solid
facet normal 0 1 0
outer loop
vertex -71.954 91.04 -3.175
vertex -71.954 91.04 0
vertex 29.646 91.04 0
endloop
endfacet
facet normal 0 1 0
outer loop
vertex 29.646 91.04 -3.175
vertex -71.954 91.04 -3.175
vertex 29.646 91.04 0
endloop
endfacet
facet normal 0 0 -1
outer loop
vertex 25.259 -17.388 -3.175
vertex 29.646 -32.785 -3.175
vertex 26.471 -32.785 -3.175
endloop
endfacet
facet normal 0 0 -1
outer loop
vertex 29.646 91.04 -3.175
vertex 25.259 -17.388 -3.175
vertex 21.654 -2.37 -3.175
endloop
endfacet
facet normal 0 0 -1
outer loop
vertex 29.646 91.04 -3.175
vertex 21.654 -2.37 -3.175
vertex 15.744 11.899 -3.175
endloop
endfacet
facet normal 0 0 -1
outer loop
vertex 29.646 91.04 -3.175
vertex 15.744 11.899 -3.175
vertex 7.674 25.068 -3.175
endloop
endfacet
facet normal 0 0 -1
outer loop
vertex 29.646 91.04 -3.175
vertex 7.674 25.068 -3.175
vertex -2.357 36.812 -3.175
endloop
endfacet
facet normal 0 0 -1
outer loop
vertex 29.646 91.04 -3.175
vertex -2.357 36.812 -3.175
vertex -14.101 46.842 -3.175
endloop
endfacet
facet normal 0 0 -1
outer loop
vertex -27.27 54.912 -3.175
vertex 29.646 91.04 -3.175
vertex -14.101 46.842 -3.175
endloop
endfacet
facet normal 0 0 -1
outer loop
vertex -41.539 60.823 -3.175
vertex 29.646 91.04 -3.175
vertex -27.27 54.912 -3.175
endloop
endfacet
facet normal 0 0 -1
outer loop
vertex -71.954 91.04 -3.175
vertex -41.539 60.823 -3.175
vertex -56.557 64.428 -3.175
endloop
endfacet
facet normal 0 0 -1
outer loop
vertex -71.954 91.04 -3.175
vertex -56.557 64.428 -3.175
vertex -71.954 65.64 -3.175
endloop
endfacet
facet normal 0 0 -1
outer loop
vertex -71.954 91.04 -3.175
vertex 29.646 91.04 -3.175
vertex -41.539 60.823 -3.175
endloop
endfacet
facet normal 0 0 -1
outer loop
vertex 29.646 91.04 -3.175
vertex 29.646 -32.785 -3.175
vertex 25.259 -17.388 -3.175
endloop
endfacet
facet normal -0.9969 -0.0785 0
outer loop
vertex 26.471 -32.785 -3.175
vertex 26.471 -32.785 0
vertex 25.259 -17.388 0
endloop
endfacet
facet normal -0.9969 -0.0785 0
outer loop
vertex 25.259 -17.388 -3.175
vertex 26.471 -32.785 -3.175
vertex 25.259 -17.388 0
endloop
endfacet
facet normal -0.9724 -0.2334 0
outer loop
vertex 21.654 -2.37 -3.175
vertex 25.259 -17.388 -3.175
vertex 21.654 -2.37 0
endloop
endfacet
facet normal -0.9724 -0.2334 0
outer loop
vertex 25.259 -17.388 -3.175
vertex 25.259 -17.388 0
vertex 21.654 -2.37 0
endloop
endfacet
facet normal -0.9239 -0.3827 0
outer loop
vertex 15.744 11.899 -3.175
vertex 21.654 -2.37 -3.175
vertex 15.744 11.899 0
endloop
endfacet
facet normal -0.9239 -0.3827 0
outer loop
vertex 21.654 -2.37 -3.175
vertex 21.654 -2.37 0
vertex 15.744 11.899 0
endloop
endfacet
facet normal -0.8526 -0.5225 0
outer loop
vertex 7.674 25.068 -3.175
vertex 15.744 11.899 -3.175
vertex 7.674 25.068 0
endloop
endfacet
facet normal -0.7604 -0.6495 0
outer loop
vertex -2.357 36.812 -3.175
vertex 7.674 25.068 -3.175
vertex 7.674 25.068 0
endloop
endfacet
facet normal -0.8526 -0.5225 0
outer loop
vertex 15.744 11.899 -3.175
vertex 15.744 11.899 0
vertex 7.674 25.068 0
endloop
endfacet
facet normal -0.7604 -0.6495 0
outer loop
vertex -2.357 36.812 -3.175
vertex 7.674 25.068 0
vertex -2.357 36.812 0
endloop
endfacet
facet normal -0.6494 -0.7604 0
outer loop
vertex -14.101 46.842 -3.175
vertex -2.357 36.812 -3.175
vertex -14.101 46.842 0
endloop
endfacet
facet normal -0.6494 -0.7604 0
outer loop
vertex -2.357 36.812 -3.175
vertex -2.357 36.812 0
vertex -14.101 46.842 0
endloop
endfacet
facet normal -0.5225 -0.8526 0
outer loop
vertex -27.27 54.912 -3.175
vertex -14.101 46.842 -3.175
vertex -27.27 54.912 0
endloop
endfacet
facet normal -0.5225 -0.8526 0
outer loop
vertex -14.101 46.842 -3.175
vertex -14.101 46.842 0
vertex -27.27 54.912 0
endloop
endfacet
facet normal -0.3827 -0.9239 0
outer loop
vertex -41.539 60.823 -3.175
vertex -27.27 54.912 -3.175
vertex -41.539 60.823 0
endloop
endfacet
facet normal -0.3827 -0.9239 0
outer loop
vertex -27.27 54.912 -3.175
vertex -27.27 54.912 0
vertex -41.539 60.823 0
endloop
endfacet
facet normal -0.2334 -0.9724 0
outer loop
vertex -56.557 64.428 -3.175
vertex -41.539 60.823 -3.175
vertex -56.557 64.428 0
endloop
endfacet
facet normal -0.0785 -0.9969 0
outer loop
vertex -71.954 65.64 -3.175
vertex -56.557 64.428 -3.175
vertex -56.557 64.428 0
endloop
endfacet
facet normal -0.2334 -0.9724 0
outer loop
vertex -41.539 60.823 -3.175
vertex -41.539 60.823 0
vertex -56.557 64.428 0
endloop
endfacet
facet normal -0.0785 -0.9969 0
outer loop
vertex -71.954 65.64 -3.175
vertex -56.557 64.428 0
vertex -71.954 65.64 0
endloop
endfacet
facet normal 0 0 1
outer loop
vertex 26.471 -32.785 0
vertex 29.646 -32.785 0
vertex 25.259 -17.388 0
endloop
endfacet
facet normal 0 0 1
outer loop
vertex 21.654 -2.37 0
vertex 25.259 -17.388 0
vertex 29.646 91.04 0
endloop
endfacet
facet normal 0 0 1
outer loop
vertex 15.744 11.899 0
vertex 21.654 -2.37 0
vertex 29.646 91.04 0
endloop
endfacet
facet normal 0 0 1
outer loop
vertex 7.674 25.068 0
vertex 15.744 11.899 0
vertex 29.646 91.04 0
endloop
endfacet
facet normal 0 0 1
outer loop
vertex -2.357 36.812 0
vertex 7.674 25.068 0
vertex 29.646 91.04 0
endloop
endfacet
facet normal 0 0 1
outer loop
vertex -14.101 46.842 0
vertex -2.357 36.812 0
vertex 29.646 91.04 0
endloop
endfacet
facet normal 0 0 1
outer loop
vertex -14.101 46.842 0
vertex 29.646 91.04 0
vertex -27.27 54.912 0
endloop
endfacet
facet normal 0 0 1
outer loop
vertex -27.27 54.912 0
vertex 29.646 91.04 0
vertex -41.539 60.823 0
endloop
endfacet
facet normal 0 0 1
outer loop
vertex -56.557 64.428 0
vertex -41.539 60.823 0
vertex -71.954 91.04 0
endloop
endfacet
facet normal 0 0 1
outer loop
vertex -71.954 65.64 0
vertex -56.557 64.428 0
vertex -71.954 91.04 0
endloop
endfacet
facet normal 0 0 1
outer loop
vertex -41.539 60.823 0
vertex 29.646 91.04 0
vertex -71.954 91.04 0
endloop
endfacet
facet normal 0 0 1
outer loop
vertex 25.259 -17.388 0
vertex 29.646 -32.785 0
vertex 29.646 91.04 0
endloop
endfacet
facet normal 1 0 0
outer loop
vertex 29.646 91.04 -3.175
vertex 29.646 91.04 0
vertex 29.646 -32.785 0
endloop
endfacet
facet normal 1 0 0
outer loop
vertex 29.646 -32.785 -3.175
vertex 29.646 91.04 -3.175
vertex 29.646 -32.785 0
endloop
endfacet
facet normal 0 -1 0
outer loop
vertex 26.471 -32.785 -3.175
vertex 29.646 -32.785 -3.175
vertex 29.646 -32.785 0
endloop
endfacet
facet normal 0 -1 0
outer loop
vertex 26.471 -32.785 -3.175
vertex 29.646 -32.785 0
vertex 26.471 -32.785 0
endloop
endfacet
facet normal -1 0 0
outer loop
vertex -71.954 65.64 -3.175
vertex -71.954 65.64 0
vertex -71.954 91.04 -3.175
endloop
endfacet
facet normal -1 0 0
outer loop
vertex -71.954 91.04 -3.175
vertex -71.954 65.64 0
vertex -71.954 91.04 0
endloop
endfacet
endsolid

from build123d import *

# Parameters (mm, degrees)
BOSS_EXTRUDE1_DEPTH = 3.175


with BuildPart() as part:
    # Sketch1 → Boss-Extrude1 (new body)
    with BuildSketch(Plane.XY):
        with BuildLine():
            Line((-71.953806461, 91.039951247), (29.646193539, 91.039951247))
            Line((29.646193539, 91.039951247), (29.646193539, -32.785048753))
            Line((29.646193539, -32.785048753), (26.471193539, -32.785048753))
            ThreePointArc((26.471193539, -32.785048753), (-2.356821523, 36.811936186), (-71.953806461, 65.639951247))
            Line((-71.953806461, 65.639951247), (-71.953806461, 91.039951247))
        make_face()
    extrude(amount=-BOSS_EXTRUDE1_DEPTH)


solid = part.part
